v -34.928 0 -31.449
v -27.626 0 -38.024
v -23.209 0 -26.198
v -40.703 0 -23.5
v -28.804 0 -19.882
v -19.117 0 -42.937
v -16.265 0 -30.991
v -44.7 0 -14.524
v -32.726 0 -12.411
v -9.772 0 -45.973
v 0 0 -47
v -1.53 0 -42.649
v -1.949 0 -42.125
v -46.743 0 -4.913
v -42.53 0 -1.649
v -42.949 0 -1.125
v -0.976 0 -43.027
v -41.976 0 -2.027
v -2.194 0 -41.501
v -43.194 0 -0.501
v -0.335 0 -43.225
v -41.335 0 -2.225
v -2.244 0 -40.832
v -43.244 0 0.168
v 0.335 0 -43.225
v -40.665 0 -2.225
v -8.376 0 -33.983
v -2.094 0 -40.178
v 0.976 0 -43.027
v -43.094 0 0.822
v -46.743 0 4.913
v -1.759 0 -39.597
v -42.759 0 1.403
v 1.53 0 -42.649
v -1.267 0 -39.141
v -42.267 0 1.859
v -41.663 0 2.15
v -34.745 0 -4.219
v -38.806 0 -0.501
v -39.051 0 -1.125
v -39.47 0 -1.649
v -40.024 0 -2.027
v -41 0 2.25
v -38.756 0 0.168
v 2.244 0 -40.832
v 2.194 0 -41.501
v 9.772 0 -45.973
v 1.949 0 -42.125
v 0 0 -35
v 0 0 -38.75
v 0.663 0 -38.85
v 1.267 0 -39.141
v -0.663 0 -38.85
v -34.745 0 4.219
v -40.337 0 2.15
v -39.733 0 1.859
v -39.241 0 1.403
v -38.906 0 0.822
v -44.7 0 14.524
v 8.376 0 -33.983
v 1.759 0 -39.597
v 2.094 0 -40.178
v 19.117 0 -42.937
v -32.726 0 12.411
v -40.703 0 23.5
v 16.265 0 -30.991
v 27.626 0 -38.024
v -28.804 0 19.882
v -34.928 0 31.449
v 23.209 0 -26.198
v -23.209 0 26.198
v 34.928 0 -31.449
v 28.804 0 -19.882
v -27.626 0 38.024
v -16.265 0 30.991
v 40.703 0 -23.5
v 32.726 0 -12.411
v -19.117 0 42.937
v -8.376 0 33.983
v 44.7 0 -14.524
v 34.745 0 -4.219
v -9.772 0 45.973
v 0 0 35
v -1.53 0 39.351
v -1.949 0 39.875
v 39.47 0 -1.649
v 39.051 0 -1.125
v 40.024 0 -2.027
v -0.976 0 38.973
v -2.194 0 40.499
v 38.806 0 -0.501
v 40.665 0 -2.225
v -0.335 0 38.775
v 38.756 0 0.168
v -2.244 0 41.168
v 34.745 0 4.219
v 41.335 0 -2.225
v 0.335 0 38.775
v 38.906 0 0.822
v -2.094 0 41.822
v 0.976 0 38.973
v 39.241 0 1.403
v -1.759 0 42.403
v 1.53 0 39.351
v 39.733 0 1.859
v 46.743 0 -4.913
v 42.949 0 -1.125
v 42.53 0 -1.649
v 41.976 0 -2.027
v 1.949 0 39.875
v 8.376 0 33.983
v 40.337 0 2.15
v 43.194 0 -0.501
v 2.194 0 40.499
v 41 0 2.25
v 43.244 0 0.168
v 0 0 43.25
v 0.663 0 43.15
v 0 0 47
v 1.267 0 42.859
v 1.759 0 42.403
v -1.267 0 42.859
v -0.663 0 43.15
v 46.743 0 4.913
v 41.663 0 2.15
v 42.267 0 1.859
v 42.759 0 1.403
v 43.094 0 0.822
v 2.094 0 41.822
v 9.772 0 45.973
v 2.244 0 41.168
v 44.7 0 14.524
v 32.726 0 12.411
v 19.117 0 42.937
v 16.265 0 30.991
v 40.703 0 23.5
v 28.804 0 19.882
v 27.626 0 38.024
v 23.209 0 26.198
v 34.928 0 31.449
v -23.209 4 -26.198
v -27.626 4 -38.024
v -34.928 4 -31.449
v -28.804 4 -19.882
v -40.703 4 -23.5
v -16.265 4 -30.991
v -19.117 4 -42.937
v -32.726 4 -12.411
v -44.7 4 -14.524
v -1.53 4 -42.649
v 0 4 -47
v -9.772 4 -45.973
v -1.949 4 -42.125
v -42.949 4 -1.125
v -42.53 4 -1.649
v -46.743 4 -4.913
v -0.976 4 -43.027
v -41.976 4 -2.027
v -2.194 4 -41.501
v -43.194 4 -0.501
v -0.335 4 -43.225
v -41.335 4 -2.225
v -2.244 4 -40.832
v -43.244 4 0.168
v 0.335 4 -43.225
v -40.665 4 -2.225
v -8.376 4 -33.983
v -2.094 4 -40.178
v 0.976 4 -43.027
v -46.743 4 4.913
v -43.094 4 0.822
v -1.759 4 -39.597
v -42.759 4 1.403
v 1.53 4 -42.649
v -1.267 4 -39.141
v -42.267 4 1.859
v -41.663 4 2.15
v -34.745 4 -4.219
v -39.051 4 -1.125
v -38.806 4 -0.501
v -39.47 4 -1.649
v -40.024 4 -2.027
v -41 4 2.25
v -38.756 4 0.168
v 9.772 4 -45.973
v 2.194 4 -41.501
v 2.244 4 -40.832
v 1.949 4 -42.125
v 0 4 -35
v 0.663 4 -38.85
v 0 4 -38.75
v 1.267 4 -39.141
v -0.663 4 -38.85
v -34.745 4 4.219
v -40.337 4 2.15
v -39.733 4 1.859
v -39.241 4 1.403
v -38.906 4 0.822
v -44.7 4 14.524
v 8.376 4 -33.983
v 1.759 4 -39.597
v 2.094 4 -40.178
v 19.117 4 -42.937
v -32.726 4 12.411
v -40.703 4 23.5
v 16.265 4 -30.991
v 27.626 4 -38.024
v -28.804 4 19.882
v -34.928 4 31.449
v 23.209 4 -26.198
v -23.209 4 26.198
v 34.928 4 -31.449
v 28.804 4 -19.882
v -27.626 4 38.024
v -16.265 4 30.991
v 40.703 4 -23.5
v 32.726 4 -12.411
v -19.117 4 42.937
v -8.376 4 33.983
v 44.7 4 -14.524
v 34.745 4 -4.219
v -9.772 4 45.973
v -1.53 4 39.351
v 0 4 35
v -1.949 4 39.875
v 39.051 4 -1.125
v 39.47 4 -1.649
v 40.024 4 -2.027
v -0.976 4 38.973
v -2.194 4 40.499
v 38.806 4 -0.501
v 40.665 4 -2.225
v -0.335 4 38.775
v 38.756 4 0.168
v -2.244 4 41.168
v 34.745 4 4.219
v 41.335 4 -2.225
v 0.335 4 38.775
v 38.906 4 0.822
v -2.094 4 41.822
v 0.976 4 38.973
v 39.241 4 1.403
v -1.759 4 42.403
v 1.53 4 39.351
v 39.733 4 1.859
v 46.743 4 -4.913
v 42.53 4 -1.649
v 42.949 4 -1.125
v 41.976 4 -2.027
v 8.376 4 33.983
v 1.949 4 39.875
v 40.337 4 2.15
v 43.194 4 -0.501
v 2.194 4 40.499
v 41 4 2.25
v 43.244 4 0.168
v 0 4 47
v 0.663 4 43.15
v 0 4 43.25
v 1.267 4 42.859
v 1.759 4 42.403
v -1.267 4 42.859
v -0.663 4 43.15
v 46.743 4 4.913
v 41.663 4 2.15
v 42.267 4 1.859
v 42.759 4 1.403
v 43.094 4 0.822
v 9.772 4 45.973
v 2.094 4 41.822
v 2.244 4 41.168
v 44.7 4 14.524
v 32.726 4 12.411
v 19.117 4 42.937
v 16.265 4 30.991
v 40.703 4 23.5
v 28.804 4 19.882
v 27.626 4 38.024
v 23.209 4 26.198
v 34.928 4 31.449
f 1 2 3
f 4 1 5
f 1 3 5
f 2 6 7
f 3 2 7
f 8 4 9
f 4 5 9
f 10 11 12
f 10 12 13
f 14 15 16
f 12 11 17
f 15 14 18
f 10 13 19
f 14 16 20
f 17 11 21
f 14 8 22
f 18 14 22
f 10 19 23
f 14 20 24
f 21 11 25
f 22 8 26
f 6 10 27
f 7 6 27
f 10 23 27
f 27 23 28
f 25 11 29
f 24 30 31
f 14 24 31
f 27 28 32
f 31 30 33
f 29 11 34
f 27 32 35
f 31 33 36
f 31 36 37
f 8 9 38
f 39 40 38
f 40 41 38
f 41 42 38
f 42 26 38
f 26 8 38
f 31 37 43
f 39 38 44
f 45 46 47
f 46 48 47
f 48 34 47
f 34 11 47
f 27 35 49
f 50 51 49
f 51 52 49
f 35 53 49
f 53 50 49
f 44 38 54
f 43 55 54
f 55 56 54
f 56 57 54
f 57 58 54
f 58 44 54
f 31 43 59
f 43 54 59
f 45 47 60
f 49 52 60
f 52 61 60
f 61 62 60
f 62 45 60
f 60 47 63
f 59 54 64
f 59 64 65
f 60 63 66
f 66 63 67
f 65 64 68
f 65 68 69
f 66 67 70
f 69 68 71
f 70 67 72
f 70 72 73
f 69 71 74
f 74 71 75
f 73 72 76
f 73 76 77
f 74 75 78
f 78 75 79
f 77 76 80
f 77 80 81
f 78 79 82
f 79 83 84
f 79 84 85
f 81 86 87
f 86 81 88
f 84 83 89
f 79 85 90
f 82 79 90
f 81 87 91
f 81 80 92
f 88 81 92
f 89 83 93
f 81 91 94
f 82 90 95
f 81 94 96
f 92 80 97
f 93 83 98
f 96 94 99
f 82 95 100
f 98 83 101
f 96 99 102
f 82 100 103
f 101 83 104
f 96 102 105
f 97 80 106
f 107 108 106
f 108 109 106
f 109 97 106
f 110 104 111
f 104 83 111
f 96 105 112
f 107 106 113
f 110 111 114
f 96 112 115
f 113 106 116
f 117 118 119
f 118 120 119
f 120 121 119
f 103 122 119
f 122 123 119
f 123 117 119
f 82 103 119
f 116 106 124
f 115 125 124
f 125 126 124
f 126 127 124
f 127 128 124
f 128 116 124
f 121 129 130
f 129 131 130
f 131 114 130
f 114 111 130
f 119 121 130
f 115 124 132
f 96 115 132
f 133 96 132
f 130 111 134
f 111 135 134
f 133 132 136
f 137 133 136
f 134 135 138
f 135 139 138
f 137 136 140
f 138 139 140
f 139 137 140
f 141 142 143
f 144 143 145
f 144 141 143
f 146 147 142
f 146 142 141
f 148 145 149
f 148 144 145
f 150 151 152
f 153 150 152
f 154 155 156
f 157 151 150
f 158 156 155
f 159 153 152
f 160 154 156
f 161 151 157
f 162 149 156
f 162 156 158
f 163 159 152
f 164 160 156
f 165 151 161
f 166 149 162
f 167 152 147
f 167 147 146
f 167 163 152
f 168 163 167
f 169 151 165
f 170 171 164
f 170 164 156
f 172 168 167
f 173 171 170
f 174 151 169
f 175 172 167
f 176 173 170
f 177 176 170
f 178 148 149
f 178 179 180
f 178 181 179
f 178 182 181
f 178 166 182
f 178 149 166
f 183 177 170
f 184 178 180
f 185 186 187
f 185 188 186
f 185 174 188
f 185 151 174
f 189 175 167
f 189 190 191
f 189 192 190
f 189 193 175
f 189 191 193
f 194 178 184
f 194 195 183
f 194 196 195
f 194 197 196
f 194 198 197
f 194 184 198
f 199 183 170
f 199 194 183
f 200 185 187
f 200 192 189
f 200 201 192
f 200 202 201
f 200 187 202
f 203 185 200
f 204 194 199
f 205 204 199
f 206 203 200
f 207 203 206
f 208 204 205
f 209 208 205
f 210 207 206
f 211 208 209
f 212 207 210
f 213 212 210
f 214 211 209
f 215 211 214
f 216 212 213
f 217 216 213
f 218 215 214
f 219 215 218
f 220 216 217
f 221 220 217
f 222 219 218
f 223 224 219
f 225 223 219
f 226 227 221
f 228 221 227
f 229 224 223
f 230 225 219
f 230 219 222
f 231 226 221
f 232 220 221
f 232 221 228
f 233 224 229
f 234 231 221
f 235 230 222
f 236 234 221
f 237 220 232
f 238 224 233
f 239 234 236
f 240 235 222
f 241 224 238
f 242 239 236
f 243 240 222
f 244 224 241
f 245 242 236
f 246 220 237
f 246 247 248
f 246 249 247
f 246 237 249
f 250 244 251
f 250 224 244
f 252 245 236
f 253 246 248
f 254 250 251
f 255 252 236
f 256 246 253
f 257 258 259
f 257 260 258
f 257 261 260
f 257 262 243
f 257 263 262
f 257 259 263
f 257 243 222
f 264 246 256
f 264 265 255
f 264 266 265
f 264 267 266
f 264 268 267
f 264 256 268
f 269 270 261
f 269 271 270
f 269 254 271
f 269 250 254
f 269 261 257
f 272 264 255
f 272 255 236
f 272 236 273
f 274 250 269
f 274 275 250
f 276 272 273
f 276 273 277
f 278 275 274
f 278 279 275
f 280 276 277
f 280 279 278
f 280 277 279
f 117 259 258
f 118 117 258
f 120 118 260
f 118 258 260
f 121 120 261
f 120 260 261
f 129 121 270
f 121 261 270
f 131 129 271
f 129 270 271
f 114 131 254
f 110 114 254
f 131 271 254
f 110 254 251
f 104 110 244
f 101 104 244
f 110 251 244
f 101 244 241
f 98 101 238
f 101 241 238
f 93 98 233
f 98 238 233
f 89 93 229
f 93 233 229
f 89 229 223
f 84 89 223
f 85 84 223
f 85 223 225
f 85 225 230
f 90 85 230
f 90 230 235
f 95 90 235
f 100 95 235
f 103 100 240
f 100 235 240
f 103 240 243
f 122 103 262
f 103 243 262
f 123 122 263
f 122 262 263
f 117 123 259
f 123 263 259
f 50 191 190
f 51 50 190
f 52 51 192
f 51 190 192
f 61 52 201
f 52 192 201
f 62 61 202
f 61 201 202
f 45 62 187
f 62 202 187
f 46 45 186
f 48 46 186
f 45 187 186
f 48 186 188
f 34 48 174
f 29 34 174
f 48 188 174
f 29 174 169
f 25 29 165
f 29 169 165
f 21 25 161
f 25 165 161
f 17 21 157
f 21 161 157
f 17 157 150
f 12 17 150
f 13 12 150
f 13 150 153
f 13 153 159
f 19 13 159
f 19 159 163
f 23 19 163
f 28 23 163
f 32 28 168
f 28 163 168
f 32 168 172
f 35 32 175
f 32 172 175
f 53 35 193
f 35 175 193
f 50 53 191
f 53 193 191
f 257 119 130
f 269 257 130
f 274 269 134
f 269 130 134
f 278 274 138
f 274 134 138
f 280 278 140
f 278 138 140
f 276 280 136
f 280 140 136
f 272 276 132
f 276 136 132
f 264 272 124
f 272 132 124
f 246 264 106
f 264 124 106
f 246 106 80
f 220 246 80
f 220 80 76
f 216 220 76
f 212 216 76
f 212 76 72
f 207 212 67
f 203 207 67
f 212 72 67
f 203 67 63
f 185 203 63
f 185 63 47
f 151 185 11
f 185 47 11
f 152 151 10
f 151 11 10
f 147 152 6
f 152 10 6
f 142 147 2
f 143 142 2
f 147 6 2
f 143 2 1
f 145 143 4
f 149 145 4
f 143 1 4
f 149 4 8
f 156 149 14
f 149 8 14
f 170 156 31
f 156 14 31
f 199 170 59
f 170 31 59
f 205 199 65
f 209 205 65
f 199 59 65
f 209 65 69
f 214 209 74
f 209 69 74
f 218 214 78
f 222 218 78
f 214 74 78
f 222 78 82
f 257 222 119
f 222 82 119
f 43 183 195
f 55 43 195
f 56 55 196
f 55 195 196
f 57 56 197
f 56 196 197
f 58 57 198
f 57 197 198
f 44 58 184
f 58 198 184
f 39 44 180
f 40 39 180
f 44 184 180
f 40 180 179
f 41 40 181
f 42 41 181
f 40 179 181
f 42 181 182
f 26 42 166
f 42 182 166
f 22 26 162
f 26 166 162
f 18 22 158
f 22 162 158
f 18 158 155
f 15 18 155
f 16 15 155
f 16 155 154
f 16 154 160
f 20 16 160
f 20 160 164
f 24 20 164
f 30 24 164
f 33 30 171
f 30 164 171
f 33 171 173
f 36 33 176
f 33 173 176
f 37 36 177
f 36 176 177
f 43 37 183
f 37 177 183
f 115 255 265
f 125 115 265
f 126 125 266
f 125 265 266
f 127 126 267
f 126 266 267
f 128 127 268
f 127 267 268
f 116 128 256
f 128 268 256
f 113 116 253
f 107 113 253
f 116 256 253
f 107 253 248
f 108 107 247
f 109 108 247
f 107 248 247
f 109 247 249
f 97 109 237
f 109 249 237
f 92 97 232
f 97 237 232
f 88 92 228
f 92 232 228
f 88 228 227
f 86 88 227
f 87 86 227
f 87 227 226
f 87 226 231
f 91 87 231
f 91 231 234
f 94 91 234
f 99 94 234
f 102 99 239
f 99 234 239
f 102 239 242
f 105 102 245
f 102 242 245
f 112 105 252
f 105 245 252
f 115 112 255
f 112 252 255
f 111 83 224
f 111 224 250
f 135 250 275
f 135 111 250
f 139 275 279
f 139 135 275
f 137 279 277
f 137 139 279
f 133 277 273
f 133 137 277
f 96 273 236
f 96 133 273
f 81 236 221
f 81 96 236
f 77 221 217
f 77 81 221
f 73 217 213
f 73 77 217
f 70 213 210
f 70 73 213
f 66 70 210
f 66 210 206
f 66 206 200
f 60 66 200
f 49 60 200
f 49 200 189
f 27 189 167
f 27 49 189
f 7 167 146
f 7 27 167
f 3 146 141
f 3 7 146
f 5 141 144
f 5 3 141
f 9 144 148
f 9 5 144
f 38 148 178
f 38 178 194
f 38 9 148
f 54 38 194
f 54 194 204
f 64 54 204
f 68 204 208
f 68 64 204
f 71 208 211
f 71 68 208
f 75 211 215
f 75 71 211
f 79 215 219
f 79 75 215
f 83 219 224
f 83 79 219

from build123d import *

# Parameters (mm, degrees)
SCHIZZO1_R                   = 47
SCHIZZO1_R_2                 = 35
ESTRUSIONE_ESTRUSIONE1_DEPTH = 4
SCHIZZO2_R                   = 2.25
TAGLIO_ESTRUSIONE1_DEPTH     = 4


with BuildPart() as part:
    # Schizzo1 → Estrusione-Estrusione1 (new body)
    with BuildSketch(Plane(origin=(0, 0, 0), x_dir=(1, 0, 0), z_dir=(0, 1, 0))):
        with Locations(Location((0, 0, 0), (0, 0, 270))):
            Circle(SCHIZZO1_R)
        with Locations(Location((0, 0, 0), (0, 0, 270))):
            Circle(SCHIZZO1_R_2, mode=Mode.SUBTRACT)
    extrude(amount=ESTRUSIONE_ESTRUSIONE1_DEPTH)

    # Schizzo2 → Taglio-Estrusione1 (cut)
    with BuildSketch(Plane(origin=(0, 4, 0), x_dir=(1, 0, 0), z_dir=(0, 1, 0))):
        with Locations(Location((0, 41, 0), (0, 0, 270))):
            Circle(SCHIZZO2_R)
        with Locations(Location((41, 0, 0), (0, 0, 270))):
            Circle(SCHIZZO2_R)
        with Locations(Location((0, -41, 0), (0, 0, 270))):
            Circle(SCHIZZO2_R)
        with Locations(Location((-41, 0, 0), (0, 0, 270))):
            Circle(SCHIZZO2_R)
    extrude(amount=-TAGLIO_ESTRUSIONE1_DEPTH, mode=Mode.SUBTRACT)


solid = part.part
